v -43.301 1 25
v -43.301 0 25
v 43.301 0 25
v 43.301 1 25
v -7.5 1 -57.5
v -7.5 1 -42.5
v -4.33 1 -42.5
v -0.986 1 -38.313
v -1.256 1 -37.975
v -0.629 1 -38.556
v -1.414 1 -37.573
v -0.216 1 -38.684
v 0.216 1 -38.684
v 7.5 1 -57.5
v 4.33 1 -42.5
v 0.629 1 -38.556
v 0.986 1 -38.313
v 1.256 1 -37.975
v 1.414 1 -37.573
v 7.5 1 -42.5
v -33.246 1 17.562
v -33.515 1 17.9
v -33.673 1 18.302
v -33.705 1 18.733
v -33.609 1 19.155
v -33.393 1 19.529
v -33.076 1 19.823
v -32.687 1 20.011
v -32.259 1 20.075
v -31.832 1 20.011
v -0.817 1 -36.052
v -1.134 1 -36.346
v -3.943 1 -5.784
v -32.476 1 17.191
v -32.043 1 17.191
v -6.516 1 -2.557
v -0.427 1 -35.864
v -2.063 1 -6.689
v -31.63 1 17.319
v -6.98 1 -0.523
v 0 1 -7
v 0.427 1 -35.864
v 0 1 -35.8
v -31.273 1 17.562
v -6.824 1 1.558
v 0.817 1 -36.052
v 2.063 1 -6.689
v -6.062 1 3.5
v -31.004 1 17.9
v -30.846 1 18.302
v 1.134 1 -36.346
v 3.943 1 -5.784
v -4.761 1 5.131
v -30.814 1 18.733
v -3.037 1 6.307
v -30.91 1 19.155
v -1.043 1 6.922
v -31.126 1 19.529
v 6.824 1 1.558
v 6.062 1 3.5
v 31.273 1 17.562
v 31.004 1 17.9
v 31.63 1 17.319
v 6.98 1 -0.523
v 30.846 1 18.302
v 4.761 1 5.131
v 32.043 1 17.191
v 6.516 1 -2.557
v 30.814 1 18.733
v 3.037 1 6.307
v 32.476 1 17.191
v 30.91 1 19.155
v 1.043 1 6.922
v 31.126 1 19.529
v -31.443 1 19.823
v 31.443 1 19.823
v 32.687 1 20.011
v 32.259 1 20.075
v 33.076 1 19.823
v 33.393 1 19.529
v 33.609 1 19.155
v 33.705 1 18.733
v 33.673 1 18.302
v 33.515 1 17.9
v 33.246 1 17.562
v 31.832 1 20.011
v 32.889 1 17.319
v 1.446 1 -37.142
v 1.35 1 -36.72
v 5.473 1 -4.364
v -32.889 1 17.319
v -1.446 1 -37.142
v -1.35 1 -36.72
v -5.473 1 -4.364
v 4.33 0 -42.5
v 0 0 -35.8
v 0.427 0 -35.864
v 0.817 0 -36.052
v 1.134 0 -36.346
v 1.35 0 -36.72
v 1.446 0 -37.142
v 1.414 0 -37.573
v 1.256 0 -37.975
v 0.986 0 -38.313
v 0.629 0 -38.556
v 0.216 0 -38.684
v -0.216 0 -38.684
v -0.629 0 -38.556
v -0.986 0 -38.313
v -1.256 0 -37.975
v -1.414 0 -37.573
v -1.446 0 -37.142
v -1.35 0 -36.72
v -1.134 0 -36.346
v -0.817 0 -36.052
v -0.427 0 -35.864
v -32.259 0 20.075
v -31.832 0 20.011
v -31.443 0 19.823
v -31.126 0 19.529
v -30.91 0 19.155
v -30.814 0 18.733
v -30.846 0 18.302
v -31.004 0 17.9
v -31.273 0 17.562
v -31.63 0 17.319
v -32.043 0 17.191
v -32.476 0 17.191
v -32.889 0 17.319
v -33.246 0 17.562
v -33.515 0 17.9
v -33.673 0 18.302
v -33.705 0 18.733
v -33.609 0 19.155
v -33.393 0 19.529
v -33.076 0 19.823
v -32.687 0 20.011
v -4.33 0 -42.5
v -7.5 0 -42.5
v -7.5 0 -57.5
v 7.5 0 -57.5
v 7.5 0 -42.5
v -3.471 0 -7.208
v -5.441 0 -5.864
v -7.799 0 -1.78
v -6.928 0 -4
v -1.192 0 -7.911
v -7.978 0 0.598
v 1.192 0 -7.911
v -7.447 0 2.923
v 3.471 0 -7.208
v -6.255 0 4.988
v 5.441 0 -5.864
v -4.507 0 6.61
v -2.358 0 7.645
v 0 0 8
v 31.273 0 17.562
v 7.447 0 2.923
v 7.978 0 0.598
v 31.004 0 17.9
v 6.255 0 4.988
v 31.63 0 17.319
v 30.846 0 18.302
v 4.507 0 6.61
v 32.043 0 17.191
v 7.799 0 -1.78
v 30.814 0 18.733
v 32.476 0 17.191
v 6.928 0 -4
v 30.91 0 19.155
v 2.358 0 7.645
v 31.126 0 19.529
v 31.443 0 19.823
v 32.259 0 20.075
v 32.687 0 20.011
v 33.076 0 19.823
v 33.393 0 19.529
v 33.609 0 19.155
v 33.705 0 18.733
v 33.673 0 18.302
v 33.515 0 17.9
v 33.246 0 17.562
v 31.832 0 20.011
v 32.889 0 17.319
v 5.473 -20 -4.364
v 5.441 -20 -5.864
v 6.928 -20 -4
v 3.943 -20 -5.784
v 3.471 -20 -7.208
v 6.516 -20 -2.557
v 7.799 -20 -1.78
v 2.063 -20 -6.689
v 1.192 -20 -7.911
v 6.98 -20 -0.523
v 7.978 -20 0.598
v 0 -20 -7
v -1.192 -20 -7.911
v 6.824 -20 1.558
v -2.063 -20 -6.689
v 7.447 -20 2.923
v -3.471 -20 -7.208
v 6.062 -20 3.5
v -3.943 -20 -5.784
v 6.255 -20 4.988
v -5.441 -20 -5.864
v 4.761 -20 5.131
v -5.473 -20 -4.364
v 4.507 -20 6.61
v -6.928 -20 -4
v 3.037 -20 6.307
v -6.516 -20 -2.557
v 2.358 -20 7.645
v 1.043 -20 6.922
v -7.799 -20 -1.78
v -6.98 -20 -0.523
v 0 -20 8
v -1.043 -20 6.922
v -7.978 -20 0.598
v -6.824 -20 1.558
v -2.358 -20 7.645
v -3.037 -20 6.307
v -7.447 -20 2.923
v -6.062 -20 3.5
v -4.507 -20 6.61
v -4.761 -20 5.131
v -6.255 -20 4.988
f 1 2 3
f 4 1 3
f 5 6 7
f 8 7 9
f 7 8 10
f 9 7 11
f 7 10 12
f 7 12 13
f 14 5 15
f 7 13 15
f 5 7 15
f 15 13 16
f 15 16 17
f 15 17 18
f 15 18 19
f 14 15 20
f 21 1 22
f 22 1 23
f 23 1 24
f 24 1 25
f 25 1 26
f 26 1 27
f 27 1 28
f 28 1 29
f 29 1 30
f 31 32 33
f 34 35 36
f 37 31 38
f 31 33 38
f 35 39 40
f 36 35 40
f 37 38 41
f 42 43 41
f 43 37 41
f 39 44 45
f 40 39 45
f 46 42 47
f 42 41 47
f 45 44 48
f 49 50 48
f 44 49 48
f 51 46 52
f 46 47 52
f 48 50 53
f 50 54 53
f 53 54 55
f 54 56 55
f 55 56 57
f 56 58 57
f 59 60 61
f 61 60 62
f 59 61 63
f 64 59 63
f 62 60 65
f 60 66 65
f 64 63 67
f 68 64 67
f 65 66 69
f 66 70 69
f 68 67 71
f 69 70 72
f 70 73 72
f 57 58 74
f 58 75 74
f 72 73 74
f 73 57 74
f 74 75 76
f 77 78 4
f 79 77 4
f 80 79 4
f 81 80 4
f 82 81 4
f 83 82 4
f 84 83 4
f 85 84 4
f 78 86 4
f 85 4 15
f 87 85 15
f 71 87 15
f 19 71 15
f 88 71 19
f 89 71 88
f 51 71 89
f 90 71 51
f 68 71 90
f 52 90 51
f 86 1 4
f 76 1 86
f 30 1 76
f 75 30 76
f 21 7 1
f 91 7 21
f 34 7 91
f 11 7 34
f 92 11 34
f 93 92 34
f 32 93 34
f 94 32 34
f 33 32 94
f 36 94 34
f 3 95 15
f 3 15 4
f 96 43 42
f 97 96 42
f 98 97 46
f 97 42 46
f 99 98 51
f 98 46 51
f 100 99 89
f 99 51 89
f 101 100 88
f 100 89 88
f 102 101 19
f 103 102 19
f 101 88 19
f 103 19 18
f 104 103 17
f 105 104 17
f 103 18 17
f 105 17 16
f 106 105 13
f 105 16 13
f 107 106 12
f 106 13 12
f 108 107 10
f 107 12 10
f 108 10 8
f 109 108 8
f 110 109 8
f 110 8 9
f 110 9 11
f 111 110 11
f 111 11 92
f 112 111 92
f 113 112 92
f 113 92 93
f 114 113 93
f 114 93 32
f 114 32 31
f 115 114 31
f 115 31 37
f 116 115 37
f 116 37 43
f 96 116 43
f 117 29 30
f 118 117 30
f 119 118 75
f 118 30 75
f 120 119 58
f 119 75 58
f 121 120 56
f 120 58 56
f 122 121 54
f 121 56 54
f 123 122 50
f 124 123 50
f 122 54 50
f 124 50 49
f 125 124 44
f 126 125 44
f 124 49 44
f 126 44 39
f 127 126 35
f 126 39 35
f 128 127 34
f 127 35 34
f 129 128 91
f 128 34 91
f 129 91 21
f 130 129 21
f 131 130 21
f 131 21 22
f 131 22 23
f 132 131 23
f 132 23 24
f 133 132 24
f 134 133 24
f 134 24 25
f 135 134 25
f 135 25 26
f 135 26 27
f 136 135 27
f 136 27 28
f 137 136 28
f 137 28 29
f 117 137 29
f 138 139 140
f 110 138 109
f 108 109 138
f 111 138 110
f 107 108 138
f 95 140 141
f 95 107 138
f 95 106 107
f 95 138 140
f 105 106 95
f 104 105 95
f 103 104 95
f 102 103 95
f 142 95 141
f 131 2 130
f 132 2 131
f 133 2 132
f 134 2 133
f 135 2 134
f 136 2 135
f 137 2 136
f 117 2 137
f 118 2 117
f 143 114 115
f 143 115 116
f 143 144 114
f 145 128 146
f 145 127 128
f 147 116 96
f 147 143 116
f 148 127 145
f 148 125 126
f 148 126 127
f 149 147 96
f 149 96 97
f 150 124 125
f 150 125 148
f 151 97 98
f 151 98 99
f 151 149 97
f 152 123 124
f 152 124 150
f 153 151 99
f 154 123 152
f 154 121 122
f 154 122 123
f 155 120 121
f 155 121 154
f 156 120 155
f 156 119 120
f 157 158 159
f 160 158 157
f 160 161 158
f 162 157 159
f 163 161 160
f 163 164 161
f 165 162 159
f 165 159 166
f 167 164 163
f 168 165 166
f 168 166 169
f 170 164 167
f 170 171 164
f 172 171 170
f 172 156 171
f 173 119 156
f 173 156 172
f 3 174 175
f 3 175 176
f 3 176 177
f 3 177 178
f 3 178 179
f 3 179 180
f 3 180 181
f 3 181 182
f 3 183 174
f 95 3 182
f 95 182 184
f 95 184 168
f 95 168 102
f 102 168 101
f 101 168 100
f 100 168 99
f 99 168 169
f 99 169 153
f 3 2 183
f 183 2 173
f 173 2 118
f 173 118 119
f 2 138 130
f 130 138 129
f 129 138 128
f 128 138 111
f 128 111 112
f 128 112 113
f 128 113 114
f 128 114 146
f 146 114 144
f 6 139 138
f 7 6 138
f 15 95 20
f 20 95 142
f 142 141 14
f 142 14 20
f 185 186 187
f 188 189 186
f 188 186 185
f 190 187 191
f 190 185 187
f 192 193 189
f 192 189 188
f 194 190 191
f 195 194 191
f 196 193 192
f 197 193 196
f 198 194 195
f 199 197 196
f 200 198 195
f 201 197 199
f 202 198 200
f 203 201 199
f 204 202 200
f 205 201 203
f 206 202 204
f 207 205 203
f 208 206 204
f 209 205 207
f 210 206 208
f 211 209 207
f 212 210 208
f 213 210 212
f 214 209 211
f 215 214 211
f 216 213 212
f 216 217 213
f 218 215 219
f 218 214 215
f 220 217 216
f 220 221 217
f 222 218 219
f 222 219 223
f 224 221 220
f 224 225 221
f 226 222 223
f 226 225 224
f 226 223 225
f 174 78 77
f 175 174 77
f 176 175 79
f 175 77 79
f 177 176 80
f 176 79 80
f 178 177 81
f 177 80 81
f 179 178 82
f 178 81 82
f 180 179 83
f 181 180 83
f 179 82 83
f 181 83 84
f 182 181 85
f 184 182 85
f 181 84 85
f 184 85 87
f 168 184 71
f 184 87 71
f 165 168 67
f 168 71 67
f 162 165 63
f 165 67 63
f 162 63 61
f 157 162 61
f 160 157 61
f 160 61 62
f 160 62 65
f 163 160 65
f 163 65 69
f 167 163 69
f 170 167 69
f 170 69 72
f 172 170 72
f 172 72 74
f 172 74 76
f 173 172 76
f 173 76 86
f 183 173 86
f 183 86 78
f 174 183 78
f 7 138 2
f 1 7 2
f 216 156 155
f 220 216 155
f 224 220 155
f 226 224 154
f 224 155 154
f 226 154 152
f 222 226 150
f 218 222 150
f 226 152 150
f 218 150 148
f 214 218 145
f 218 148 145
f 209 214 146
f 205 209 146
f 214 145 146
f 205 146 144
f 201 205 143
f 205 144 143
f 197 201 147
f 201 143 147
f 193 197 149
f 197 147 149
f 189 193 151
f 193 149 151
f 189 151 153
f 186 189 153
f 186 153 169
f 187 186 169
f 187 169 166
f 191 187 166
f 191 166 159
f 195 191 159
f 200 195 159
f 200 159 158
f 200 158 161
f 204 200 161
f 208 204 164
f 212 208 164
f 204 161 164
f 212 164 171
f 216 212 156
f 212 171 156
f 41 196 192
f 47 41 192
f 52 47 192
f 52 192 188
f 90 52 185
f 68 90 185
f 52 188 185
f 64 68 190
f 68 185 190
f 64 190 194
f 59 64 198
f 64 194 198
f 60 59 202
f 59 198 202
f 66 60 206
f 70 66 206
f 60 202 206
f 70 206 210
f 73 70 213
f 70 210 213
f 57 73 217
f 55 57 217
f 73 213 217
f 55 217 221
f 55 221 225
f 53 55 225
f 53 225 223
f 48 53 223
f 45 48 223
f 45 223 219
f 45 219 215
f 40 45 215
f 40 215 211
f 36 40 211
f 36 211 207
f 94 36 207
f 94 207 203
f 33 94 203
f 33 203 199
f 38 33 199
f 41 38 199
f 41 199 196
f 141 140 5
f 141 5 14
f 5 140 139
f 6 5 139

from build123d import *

# Parameters (mm, degrees)
BOSS_EXTRUDE3_DEPTH = 1.25
SKETCH5_R           = 1.45
CUT_EXTRUDE1_DEPTH  = 1.25
SKETCH6_R           = 8
BOSS_EXTRUDE6_DEPTH = 20
SKETCH8_R           = 6
CUT_EXTRUDE5_DEPTH  = 30
SKETCH9_R           = 7
CUT_EXTRUDE7_DEPTH  = 25
SKETCH10_R          = 52.083932338
CUT_EXTRUDE9_DEPTH  = 0.25
SKETCH11_W          = 15
SKETCH11_H          = 15
BOSS_EXTRUDE9_DEPTH = 1


with BuildPart() as part:
    # Sketch1 → Boss-Extrude3 (new body)
    with BuildSketch(Plane(origin=(0, 0, 0), x_dir=(1, 0, 0), z_dir=(0, 1, 0))):
        Polygon((0, 50), (43.301270189, -25), (0, 0), align=None)
        Polygon((0, 0), (0, 50), (-43.301270189, -25), align=None)
        Polygon((0, 0), (-43.301270189, -25), (43.301270189, -25), align=None)
    extrude(amount=BOSS_EXTRUDE3_DEPTH)

    # Sketch5 → Cut-Extrude1 (cut)
    with BuildSketch(Plane(origin=(0, 1.25, 0), x_dir=(1, 0, 0), z_dir=(0, 1, 0))):
        with Locations(Location((0, 37.25, 0), (0, 0, 270))):
            Circle(SKETCH5_R)
        with Locations(Location((-32.259446291, -18.625, 0), (0, 0, 270))):
            Circle(SKETCH5_R)
        with Locations(Location((32.259446291, -18.625, 0), (0, 0, 270))):
            Circle(SKETCH5_R)
    extrude(amount=-CUT_EXTRUDE1_DEPTH, mode=Mode.SUBTRACT)

    # Sketch6 → Boss-Extrude6 (add)
    with BuildSketch(Plane.XZ):
        with Locations(Location((0, 0, 0), (0, 0, 90))):
            Circle(SKETCH6_R)
    extrude(amount=BOSS_EXTRUDE6_DEPTH)

    # Sketch8 → Cut-Extrude5 (cut)
    with BuildSketch(Plane.XZ.offset(20)):
        with Locations(Location((0, 0, 0), (0, 0, 270))):
            Circle(SKETCH8_R)
    extrude(amount=-CUT_EXTRUDE5_DEPTH, mode=Mode.SUBTRACT)

    # Sketch9 → Cut-Extrude7 (cut)
    with BuildSketch(Plane.XZ.offset(20)):
        with Locations(Location((0, 0, 0), (0, 0, 270))):
            Circle(SKETCH9_R)
    extrude(amount=-CUT_EXTRUDE7_DEPTH, mode=Mode.SUBTRACT)

    # Sketch10 → Cut-Extrude9 (cut)
    with BuildSketch(Plane(origin=(0, 1.25, 0), x_dir=(1, 0, 0), z_dir=(0, 1, 0))):
        Circle(SKETCH10_R)
    extrude(amount=-CUT_EXTRUDE9_DEPTH, mode=Mode.SUBTRACT)

    # Sketch11 → Boss-Extrude9 (add)
    with BuildSketch(Plane.XZ):
        with Locations((0, -50)):
            Rectangle(SKETCH11_W, SKETCH11_H)
    extrude(amount=-BOSS_EXTRUDE9_DEPTH)


solid = part.part
